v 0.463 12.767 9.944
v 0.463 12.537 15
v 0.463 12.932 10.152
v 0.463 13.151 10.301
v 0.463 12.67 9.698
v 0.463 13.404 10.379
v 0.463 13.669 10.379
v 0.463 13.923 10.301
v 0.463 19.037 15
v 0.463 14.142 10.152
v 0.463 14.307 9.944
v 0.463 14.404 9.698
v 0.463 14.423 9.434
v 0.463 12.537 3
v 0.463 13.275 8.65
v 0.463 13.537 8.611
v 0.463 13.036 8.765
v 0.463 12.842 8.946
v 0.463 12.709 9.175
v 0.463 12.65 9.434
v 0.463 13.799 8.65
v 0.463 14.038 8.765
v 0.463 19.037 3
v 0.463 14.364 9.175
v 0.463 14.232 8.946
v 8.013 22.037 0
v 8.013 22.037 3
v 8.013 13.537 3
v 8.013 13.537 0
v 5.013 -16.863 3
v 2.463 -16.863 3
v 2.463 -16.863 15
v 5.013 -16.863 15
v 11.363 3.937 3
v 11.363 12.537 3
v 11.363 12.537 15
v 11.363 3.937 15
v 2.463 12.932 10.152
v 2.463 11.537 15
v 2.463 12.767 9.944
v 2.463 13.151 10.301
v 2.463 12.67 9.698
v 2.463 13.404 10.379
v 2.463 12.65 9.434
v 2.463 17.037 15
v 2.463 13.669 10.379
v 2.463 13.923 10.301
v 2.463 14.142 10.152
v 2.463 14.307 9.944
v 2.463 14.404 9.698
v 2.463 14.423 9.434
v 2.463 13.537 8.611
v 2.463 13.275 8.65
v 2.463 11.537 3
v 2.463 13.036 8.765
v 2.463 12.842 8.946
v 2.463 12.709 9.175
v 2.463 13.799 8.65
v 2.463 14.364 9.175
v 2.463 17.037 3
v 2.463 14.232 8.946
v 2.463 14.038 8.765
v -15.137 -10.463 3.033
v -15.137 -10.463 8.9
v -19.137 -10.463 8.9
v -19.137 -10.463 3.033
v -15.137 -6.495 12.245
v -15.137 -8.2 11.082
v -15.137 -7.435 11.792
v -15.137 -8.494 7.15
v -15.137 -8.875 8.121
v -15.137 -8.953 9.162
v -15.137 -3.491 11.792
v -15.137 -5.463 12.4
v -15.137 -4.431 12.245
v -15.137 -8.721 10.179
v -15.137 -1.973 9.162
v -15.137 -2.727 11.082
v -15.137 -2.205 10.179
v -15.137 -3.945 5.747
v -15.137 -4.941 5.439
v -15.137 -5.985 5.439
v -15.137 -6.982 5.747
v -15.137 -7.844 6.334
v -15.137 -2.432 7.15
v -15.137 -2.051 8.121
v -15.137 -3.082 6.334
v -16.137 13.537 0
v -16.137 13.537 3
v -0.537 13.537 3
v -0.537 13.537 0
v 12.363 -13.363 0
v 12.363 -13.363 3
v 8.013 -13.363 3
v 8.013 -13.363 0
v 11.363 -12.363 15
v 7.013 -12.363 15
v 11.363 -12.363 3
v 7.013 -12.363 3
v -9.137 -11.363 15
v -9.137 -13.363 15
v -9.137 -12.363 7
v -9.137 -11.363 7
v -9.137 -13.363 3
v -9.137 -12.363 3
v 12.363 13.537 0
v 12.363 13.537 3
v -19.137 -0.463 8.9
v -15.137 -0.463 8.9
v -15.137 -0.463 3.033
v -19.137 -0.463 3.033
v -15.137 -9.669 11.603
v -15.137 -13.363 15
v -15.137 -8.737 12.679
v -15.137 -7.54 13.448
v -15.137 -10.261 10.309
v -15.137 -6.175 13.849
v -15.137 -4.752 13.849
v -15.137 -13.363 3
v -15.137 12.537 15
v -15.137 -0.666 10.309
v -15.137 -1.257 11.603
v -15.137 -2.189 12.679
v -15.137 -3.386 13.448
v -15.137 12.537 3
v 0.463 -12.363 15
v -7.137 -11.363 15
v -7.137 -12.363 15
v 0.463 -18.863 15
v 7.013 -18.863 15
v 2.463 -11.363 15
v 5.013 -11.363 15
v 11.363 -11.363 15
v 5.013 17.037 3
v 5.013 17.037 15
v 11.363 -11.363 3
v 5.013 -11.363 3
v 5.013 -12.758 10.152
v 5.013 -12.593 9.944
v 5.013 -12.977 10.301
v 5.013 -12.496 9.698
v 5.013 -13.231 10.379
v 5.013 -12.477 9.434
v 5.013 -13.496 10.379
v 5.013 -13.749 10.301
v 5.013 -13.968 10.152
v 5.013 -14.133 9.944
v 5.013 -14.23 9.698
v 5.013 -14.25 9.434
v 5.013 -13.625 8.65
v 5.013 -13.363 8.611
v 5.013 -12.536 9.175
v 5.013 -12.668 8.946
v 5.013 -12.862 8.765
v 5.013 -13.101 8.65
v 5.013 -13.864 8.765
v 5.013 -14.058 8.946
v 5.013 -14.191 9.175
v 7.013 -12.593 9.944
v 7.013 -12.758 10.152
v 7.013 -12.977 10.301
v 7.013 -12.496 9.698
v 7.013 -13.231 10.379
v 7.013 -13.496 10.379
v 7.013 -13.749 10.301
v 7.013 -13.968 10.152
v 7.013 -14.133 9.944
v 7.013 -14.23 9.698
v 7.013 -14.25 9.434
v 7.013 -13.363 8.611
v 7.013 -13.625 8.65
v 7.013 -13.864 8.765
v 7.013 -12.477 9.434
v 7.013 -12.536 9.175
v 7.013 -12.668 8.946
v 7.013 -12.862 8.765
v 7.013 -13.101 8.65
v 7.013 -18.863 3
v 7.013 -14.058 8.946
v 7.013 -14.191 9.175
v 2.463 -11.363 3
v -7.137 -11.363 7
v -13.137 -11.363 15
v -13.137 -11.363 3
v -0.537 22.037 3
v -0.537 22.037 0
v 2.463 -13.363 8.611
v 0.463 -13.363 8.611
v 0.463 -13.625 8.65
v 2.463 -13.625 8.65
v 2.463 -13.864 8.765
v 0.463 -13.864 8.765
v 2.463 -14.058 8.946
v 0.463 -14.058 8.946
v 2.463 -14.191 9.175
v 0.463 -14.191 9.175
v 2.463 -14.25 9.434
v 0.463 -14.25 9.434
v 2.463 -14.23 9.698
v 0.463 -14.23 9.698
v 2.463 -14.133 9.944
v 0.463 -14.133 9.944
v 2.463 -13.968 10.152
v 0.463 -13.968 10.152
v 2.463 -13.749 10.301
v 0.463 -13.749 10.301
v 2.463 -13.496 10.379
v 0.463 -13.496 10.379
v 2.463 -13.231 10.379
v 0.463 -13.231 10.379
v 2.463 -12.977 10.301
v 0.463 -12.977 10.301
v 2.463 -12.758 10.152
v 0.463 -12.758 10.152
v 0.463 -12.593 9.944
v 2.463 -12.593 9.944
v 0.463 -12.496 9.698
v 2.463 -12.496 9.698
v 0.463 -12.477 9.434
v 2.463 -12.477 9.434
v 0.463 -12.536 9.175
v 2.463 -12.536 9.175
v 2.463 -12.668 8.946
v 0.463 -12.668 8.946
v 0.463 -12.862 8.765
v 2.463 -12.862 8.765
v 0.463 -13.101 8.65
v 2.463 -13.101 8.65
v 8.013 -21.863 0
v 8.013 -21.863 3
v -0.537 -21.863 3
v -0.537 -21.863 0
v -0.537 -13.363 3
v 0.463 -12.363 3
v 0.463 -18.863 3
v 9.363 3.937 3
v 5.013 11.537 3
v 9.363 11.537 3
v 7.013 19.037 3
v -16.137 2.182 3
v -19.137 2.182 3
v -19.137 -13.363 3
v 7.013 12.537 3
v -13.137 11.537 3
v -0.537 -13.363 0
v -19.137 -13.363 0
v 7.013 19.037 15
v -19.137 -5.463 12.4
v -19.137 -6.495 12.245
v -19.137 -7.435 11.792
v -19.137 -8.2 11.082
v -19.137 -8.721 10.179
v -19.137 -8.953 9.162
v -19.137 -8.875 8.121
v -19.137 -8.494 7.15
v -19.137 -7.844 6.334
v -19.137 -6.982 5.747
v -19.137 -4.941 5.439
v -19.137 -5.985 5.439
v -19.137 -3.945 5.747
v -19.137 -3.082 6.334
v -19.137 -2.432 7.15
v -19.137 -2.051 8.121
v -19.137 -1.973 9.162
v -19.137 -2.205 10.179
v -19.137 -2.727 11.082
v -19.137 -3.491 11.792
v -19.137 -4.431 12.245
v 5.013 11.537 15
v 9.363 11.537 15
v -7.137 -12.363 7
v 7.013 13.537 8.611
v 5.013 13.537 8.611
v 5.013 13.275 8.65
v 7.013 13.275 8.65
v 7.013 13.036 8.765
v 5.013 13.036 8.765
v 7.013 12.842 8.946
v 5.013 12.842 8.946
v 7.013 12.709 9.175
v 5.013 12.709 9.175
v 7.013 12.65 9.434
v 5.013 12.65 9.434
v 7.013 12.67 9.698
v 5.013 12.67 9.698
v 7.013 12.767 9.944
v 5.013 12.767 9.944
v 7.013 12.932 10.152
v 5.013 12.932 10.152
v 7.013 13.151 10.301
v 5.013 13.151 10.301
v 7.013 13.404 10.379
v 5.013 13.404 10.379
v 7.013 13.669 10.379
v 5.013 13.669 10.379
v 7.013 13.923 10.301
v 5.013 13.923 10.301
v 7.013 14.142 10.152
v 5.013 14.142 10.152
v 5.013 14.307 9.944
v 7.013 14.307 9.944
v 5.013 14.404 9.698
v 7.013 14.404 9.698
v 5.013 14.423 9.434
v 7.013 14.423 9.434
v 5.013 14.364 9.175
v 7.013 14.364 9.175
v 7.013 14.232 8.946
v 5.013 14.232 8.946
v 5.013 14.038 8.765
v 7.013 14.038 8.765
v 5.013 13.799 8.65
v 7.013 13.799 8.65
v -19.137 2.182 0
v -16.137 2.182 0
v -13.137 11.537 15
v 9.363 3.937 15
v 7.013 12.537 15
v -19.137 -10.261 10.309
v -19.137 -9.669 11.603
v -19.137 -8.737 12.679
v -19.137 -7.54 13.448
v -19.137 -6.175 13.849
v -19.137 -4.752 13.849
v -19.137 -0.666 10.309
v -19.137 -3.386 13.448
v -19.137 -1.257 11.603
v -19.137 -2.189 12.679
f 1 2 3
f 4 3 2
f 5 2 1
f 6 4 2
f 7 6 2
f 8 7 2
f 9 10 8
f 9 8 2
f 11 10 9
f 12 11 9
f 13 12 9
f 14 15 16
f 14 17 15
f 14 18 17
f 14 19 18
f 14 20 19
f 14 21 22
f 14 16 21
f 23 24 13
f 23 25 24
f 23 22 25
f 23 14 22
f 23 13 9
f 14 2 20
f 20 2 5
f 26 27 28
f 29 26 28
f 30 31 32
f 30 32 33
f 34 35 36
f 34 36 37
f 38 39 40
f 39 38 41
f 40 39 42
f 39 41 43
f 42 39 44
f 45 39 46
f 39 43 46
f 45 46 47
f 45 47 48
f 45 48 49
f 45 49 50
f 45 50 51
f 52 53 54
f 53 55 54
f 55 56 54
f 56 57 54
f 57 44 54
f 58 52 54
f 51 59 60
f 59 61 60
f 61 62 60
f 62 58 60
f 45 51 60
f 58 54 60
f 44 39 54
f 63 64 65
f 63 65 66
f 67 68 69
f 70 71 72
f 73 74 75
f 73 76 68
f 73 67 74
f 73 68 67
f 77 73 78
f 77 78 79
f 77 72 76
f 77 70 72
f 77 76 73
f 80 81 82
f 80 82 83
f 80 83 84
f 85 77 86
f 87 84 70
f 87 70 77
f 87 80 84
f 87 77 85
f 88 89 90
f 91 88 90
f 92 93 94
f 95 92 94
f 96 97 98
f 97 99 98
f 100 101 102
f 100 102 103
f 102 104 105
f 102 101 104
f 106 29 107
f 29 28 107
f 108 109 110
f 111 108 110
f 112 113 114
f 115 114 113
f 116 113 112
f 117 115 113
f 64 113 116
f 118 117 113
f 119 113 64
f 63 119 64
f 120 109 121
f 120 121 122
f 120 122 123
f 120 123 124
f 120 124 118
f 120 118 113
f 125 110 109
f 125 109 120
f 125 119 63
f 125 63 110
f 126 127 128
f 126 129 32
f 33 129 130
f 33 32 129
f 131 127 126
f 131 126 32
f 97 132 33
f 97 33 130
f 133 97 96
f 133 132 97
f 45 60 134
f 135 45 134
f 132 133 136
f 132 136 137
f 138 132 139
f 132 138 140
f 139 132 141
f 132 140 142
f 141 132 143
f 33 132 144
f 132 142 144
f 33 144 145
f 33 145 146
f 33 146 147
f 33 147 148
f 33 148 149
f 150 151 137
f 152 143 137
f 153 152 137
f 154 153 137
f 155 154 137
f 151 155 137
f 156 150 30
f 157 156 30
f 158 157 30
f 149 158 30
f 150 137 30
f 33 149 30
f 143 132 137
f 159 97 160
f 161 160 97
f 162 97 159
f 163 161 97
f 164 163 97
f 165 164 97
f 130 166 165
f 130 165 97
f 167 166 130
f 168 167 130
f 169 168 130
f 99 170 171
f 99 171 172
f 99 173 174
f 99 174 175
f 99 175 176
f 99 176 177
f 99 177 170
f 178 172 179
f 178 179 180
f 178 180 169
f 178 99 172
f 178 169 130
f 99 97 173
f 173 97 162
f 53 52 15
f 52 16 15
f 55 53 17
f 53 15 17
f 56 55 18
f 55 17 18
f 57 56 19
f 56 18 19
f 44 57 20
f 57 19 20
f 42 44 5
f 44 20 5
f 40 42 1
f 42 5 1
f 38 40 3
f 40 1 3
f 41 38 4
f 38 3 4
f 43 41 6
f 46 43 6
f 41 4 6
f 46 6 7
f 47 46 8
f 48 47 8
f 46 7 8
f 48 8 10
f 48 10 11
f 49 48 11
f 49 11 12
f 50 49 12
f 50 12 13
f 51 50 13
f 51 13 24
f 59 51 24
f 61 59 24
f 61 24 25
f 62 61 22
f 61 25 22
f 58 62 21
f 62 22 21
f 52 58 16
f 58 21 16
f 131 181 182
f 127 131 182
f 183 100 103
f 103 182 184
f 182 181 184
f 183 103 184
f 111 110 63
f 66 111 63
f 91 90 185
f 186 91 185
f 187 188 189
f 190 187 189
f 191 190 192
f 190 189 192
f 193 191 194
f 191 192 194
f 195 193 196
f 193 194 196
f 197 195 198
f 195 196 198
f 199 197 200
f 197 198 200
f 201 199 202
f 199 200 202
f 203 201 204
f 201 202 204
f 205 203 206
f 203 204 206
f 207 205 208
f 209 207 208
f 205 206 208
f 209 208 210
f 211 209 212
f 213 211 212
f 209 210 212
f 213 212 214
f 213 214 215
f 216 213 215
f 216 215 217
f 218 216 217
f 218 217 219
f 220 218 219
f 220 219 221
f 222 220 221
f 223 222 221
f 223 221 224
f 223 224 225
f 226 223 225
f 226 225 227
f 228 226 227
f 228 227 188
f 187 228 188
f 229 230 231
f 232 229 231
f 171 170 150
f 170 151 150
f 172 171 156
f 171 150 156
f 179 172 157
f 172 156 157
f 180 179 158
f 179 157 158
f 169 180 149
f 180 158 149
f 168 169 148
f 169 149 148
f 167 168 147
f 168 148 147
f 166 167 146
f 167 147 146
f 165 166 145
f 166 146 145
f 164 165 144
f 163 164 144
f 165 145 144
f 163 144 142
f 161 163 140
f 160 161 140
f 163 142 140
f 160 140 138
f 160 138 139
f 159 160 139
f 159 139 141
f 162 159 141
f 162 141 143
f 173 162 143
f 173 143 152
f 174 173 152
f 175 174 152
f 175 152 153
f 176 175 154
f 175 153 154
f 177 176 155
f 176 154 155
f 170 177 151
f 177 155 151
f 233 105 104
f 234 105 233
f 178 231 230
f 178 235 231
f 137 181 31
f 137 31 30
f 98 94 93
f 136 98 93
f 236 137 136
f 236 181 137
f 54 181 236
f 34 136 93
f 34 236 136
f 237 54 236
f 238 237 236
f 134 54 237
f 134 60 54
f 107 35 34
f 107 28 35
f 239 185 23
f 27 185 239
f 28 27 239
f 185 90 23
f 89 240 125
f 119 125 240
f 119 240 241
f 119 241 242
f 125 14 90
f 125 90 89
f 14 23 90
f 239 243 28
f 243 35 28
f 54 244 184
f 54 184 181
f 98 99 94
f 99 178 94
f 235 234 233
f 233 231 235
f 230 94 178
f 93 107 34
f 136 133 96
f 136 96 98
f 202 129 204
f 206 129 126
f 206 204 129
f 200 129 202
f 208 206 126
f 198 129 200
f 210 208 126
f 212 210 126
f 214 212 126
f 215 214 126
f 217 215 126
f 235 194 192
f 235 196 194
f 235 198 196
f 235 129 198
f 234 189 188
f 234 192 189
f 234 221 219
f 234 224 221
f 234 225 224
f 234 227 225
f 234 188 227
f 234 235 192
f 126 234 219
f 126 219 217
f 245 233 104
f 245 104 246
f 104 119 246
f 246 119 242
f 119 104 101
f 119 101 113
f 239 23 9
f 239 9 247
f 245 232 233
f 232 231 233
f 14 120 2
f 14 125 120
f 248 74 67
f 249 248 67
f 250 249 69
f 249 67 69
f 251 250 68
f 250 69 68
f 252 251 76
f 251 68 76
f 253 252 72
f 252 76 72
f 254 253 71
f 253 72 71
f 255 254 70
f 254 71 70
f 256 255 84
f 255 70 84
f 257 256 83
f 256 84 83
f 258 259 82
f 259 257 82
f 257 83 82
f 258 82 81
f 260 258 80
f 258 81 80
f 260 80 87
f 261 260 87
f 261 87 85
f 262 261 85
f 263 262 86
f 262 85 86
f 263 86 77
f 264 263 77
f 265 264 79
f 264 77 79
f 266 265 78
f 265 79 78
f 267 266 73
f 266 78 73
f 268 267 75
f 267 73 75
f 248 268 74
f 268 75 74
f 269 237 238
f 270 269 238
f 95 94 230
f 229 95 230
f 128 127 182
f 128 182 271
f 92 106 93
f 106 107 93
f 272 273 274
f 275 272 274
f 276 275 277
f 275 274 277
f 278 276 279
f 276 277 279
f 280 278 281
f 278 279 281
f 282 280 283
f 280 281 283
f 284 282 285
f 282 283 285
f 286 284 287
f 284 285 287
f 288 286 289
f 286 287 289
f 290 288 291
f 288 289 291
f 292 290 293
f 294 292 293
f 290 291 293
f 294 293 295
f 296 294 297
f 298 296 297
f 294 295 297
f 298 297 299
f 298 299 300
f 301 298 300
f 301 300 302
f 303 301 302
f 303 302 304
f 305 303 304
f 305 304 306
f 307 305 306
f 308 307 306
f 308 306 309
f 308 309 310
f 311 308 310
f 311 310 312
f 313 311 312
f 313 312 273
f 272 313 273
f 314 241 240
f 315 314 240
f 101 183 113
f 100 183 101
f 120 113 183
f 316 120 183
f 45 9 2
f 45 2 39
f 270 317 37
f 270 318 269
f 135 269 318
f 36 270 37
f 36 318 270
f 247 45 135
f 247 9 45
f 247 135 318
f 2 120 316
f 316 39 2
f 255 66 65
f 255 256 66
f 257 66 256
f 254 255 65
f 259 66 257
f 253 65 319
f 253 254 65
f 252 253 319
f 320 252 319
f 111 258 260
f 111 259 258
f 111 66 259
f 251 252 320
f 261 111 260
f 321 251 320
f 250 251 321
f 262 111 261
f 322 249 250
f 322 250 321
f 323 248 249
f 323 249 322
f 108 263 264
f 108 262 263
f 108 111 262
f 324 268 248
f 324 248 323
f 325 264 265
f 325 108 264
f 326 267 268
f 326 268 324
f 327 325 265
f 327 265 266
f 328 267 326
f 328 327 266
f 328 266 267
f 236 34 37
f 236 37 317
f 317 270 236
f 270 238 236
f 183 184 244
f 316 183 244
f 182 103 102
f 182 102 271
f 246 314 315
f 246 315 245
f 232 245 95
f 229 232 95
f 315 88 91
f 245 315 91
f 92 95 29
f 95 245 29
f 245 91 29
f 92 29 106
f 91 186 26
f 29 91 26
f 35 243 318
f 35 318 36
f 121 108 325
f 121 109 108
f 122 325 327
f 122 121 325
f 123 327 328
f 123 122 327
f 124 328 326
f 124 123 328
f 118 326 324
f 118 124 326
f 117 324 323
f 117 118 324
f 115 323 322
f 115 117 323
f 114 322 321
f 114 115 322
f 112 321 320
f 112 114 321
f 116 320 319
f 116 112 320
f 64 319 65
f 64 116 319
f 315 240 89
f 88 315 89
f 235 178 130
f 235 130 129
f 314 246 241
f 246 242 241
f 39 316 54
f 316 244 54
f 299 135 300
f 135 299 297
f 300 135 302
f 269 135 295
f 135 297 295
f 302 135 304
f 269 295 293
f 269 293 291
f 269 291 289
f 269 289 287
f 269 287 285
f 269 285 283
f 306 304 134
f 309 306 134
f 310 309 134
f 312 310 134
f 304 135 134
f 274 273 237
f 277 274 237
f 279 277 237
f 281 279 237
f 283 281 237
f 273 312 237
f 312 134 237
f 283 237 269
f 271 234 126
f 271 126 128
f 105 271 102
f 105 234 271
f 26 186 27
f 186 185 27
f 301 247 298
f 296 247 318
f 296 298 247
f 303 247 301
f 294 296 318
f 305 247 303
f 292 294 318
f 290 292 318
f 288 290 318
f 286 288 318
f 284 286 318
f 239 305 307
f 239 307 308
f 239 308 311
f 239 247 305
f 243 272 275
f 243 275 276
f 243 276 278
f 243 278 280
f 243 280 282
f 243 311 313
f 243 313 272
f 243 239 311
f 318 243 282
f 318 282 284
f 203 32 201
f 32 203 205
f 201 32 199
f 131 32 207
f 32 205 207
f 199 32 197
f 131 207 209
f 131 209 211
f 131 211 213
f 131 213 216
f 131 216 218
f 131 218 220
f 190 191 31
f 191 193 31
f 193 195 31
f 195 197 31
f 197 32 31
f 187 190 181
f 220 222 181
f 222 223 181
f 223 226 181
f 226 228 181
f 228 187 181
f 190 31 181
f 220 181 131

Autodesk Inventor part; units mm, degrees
ref_plane "YZ Plane" through (0, 0, 0) normal (1, 0, 0) x (0, 1, 0)
sketch "Sketch1" plane through (0, 0, 0) normal (0, 0, 1) x (1, 0, 0)
  line L0 (-20, -23) -> (20, -23)
  line L1 (20, -23) -> (20, 23)
  line L2 (20, 23) -> (-20, 23)
  line L3 (-20, 23) -> (-20, -23)
  line L4 (-20, -23) -> (20, 23) construction
  line L5 (20, -23) -> (-20, 23) construction
  point P0 (0, 0)
  dimension "Szelesseg" = 40
  dimension "Magassag" = 46
extrude "Extrusion1" add sketch "Sketch1" along normal blind 3
sketch "Sketch12" plane through (0, 0, 3) normal (0, 0, 1) x (1, 0, 0)
  line L0 (9.3631, -11.3631) -> (5.0131, -11.3631)
  line L1 (5.0131, -11.3631) -> (5.0131, -16.8631)
  line L2 (2.4631, -15.3356) -> (2.4631, -11.3631)
  line L3 (-13.1369, -11.3631) -> (-13.1369, 11.5369)
  line L4 (-13.1369, 11.5369) -> (2.4631, 11.5369)
  line L5 (2.4631, 11.5369) -> (2.4631, 17.0369)
  line L6 (2.4631, 17.0369) -> (5.0131, 17.0369)
  line L7 (5.0131, 17.0369) -> (5.0131, 11.5369)
  line L8 (5.0131, 11.5369) -> (9.3631, 11.5369)
  line L9 (9.3631, 11.5369) -> (9.3631, 3.9369)
  line L10 (7.0131, -12.3631) -> (7.0131, -18.8631)
  line L11 (7.0131, -18.8631) -> (0.4631, -18.8631)
  line L12 (0.4631, -18.8631) -> (0.4631, -12.3631)
  line L13 (-15.1369, -13.3631) -> (-15.1369, 12.5369)
  line L14 (-15.1369, 12.5369) -> (0.4631, 12.5369)
  line L15 (0.4631, 12.5369) -> (0.4631, 19.0369)
  line L16 (0.4631, 19.0369) -> (7.0131, 19.0369)
  line L17 (7.0131, 19.0369) -> (7.0131, 12.5369)
  line L18 (7.0131, 12.5369) -> (11.3631, 12.5369)
  line L19 (11.3631, 12.5369) -> (11.3631, 5.6471)
  line L20 (7.0131, -12.3631) -> (13.6631, -12.3631)
  line L21 (13.6631, -12.3631) -> (13.6631, -11.3631)
  line L22 (13.6631, -11.3631) -> (9.3631, -11.3631)
  line L23 (-9.1369, -13.3631) -> (-9.1369, -11.3631)
  line L24 (-7.1369, -12.3631) -> (-7.1369, -11.3631)
  line L25 (0.4631, -12.3631) -> (-7.1369, -12.3631)
  line L26 (-9.1369, -13.3631) -> (-15.1369, -13.3631)
  line L27 (2.4631, -11.3631) -> (-7.1369, -11.3631)
  line L28 (-9.1369, -11.3631) -> (-13.1369, -11.3631)
  line L29 (-18.3631, -21.3631) -> (-18.3631, 21.3631)
  line L30 (18.3631, 21.3631) -> (18.3631, -21.3631) projected
  line L31 (18.3631, -21.3631) -> (-18.3631, -21.3631) projected
  line L32 (-18.3631, 21.3631) -> (18.3631, 21.3631) projected
  line L33 (2.4631, -15.3356) -> (2.4631, -16.8631)
  line L34 (-16.127, -19.127) -> (16.127, -19.127) projected
  line L35 (2.4631, -16.8631) -> (5.0131, -16.8631)
  line L36 (11.3631, 5.6471) -> (11.3631, 3.9369)
  line L37 (11.3631, 3.9369) -> (9.3631, 3.9369)
  line L38 (-9.1369, -12.3631) -> (-7.1369, -12.3631)
  line L39 (-9.1369, -11.3631) -> (-7.1369, -11.3631)
  point P0 (19.6785, 0.2929)
  dimension "d83" = 22.5
  dimension "d85" = 2.55
  dimension "d86" = 2.55
  dimension "d87" = 15.6
  dimension "d88" = 15.6
  dimension "d89" = 4.35
  dimension "d90" = 4.35
  dimension "d91" = 7.6
  dimension "d92" = 5.5
  dimension "d95" = 22.9
  dimension "d97" = 2
  dimension "d98" = 2
  dimension "d99" = 2
  dimension "d100" = 2
  dimension "d101" = 2
  dimension "d102" = 2
  dimension "d103" = 4.3
  dimension "d105" = 2
  dimension "d106" = 1
  dimension "d107" = 1
  dimension "d109" = 1
  dimension "d110" = 4
  dimension "d111" = 2
  dimension "d112" = 2
  dimension "d113" = 1
  dimension "d114" = 22.9
  dimension "d125" = 2.5
  dimension "d130" = 4.7
  dimension "d132" = 9
  dimension "d133" = 5.5
  dimension "d139" = 2
extrude "Extrusion4" add sketch "Sketch12" along normal blind 12 contours L22 L21 L20 L10 L11 L12 L25 L24 L27 L2 L33 L35 L1 L0 | L24 L38 L23 L39 | L23 L26 L13 L14 L15 L16 L17 L18 L19 L36 L37 L9 L8 L7 L6 L5 L4 L3 L28
sketch "Sketch14" plane through (0, 0, 15) normal (0, 0, 1) x (1, 0, 0)
  line L0 (-9.1369, -12.3631) -> (0.4631, -12.3631) projected
  line L1 (-9.1369, -12.3631) -> (-9.1369, -11.3631)
  line L2 (-13.1369, -11.3631) -> (2.4631, -11.3631) projected
  line L3 (-7.1369, -11.3631) -> (-7.1369, -12.3631)
  point P0 (0, 0)
  dimension "d136" = 2
extrude "Extrusion5" cut sketch "Sketch14" against normal blind 8
sketch "Sketch17" plane through (7.0131, -18.8631, 3) normal (1, 0, 0) x (0, 0, -1)
  line L0 (0, 0) -> (-12, 0) projected
  line L1 (0, 7.5) -> (-12, 7.5) projected
  line L2 (0, 6.5) -> (-12, 6.5) projected
  line L3 (-12, 7.5) -> (-12, 30.4) construction
  line L4 (-12, 18.95) -> (0, 18.95) construction
  line L5 (0, 37.9) -> (-12, 37.9) construction
  line L6 (0, 31.4) -> (-12, 31.4) construction
  point P0 (3, 18.8631)
  point P1 (-6.5, 5.5)
  point P2 (-6.5, 32.4)
  dimension "d144" = 1
  dimension "d145" = 18.95
  dimension "d146" = 1
hole "Hole3" at (7.0131, -13.3631, 9.5) at (7.0131, 13.5369, 9.5) direction (-1, 0, 0) diameter 1.778 depth 8 tip angle 118
ref_plane "Work Plane1" through (-15.1369, -12.3631, 5) normal (-1, 0, 0) x (0, 0, 1)
sketch "Sketch18" plane through (-15.1369, -12.3631, 5) normal (-1, 0, 0) x (0, 0, 1)
  line L0 (10, 0) -> (0, 0) projected
  line L1 (-2, -9) -> (-2, 33.7262) projected
  circle A0 centre (3.9, 6.9) radius 3.5
  circle A1 centre (3.9, 6.9) radius 5
  point P0 (-5, 12.3631)
  point P1 (9, 0)
  dimension "d156" = 6.9
  dimension "d157" = 5.9
  dimension "d158" = 7
  dimension "d159" = 10
extrude "Extrusion6" add sketch "Sketch18" along normal blind 4
sketch "Sketch20" plane through (0, 0, 3) normal (0, 0, 1) x (1, 0, 0)
  point P0 (0, 0)
ref_plane "Work Plane2" through (0.4631, -17.8631, 14) normal (-1, 0, 0) x (0, 0, 1)
sketch "Sketch21" plane through (0.4631, -17.8631, 14) normal (-1, 0, 0) x (0, 0, 1)
  line L0 (-11, -3.5) -> (-11, 39.2262) projected
  arc A0 (-5.389, 4.5) -> (-3.611, 4.5) centre (-4.5, 4.5) ccw projected
  line L1 (0, 5.5) -> (-11, 5.5) projected
  point P0 (-14, 17.8631)
  point P1 (-9, 5.5)
  dimension "d164" = 6.5
  dimension "d165" = 1
sketch "Sketch22" plane through (-15.1369, -13.127, 3) normal (-1, 0, 0) x (0, 0, 1)
  circle A0 centre (5.9, 7.6639) radius 5 projected
  line L0 (5.9, 12.6639) -> (0.0331, 12.6639)
  line L1 (5.9, 2.6639) -> (0.0331, 2.6639)
  line L2 (0.0331, 12.6639) -> (0.0331, 2.6639)
  line L3 (0, -0.2361) -> (0, 25.6639) projected
  point P0 (-3, 13.127)
  point P1 (0, 0)
  point P2 (0, 25.4279)
  point P3 (0, 0.7639)
  point P4 (0, 24.6639)
extrude "Extrusion7" add sketch "Sketch22" along normal blind 4 contours A0 L1 L2 L0
sketch "Sketch25" plane through (13.6631, -12.3631, 3) normal (1, 0, 0) x (0, 0, -1)
  line L0 (-12, 1) -> (-12, -4.5) projected
  line L1 (0, 1) -> (-12, 1) projected
  line L2 (-12, -0.0067) -> (0, -0.0067)
  line L3 (0, -0.0067) -> (0, 1)
  line L4 (0, 1) -> (-12, 1)
  line L5 (-12, 1) -> (-12, -0.0067)
  point P0 (3, 12.3631)
extrude "Extrusion8" cut sketch "Sketch25" against normal blind 2.3
sketch "Sketch26" plane through (0, 0, 3) normal (0, 0, 1) x (1, 0, 0)
  line L0 (-19.1369, -13.3631) -> (-19.1369, 2.1817)
  line L1 (-19.1369, -0.4631) -> (-19.1369, -10.4631) projected
  line L2 (-19.1369, 2.1817) -> (-16.1369, 2.1817)
  line L3 (-16.1369, 2.1817) -> (-16.1369, 13.5369)
  line L4 (-16.1369, 13.5369) -> (-0.5369, 13.5369)
  line L5 (-0.5369, 13.5369) -> (-0.5369, 22.0369)
  line L6 (-0.5369, 22.0369) -> (8.0131, 22.0369)
  line L7 (8.0131, 22.0369) -> (8.0131, 13.5369)
  line L8 (8.0131, 13.5369) -> (12.3631, 13.5369)
  line L9 (12.3631, 13.5369) -> (12.3631, -13.3631)
  line L10 (12.3631, -13.3631) -> (8.0131, -13.3631)
  line L11 (8.0131, -13.3631) -> (8.0131, -21.8631)
  line L12 (8.0131, -21.8631) -> (-0.5369, -21.8631)
  line L13 (-0.5369, -21.8631) -> (-0.5369, -13.3631)
  line L14 (-0.5369, -13.3631) -> (-19.1369, -13.3631)
  line L15 (-15.1369, -13.3631) -> (-15.1369, 12.5369) projected
  line L16 (0.4631, 12.5369) -> (-15.1369, 12.5369) projected
  line L17 (0.4631, 19.0369) -> (0.4631, 12.5369) projected
  line L18 (7.0131, 19.0369) -> (0.4631, 19.0369) projected
  line L19 (7.0131, 12.5369) -> (7.0131, 19.0369) projected
  line L20 (11.3631, 3.9369) -> (11.3631, 12.5369) projected
  line L21 (7.0131, -12.3631) -> (11.3631, -12.3631) projected
  line L22 (7.0131, -12.3631) -> (7.0131, -18.8631) projected
  line L23 (0.4631, -18.8631) -> (7.0131, -18.8631) projected
  line L24 (-7.1369, -12.3631) -> (0.4631, -12.3631) projected
  line L25 (-20, -23) -> (20, -23) projected
  line L26 (-20, -23) -> (20, -23)
  line L27 (20, -23) -> (20, 23)
  line L28 (20, 23) -> (-20, 23)
  line L29 (-20, 23) -> (-20, -23)
  point P0 (0, 0)
  dimension "d177" = 1
  dimension "d178" = 1
  dimension "d179" = 1
  dimension "d180" = 3
  dimension "d181" = 1
  dimension "d182" = 1
  dimension "d183" = 1
  dimension "d184" = 1
  dimension "d185" = 3
  dimension "d186" = 1
  dimension "d187" = 4
  dimension "d188" = 3
extrude "Extrusion9" cut sketch "Sketch26" against normal blind 10
sketch "Sketch27" plane through (0, 0, 3) normal (0, 0, 1) x (1, 0, 0)
  line L0 (-0.5369, 22.0369) -> (-0.5369, 13.5369) projected
  line L1 (8.0131, 22.0369) -> (-0.5369, 22.0369) projected
  line L2 (-0.5369, 19.0369) -> (8.0131, 19.0369)
  line L3 (8.0131, 19.0369) -> (8.0131, 22.0369)
  line L4 (8.0131, 22.0369) -> (-0.5369, 22.0369)
  line L5 (-0.5369, 22.0369) -> (-0.5369, 19.0369)
  line L6 (-0.5369, -21.8631) -> (-0.5369, -13.3631) projected
  line L7 (8.0131, -21.8631) -> (8.0131, -13.3631) projected
  line L8 (-0.5369, -21.8631) -> (8.0131, -21.8631)
  line L9 (8.0131, -21.8631) -> (8.0131, -18.8631)
  line L10 (8.0131, -18.8631) -> (-0.5369, -18.8631)
  line L11 (-0.5369, -18.8631) -> (-0.5369, -21.8631)
  point P0 (0, 0)
equation "\"d86\" = d85"
equation "\"d90\" = d89"
equation "\"d95\" = d82"
equation "\"d9\" = 0.5 * d10"
equation "\"d12\" = d11"
equation "\"d13\" = d11"
equation "\"d14\" = d11"
equation "\"d93\" = d92"
equation "\"d82\" = 22.9"
equation "\"d10\" = 18.133333"
equation "\"d11\" = 2"
properties part number "Hip_rotation_temp"
